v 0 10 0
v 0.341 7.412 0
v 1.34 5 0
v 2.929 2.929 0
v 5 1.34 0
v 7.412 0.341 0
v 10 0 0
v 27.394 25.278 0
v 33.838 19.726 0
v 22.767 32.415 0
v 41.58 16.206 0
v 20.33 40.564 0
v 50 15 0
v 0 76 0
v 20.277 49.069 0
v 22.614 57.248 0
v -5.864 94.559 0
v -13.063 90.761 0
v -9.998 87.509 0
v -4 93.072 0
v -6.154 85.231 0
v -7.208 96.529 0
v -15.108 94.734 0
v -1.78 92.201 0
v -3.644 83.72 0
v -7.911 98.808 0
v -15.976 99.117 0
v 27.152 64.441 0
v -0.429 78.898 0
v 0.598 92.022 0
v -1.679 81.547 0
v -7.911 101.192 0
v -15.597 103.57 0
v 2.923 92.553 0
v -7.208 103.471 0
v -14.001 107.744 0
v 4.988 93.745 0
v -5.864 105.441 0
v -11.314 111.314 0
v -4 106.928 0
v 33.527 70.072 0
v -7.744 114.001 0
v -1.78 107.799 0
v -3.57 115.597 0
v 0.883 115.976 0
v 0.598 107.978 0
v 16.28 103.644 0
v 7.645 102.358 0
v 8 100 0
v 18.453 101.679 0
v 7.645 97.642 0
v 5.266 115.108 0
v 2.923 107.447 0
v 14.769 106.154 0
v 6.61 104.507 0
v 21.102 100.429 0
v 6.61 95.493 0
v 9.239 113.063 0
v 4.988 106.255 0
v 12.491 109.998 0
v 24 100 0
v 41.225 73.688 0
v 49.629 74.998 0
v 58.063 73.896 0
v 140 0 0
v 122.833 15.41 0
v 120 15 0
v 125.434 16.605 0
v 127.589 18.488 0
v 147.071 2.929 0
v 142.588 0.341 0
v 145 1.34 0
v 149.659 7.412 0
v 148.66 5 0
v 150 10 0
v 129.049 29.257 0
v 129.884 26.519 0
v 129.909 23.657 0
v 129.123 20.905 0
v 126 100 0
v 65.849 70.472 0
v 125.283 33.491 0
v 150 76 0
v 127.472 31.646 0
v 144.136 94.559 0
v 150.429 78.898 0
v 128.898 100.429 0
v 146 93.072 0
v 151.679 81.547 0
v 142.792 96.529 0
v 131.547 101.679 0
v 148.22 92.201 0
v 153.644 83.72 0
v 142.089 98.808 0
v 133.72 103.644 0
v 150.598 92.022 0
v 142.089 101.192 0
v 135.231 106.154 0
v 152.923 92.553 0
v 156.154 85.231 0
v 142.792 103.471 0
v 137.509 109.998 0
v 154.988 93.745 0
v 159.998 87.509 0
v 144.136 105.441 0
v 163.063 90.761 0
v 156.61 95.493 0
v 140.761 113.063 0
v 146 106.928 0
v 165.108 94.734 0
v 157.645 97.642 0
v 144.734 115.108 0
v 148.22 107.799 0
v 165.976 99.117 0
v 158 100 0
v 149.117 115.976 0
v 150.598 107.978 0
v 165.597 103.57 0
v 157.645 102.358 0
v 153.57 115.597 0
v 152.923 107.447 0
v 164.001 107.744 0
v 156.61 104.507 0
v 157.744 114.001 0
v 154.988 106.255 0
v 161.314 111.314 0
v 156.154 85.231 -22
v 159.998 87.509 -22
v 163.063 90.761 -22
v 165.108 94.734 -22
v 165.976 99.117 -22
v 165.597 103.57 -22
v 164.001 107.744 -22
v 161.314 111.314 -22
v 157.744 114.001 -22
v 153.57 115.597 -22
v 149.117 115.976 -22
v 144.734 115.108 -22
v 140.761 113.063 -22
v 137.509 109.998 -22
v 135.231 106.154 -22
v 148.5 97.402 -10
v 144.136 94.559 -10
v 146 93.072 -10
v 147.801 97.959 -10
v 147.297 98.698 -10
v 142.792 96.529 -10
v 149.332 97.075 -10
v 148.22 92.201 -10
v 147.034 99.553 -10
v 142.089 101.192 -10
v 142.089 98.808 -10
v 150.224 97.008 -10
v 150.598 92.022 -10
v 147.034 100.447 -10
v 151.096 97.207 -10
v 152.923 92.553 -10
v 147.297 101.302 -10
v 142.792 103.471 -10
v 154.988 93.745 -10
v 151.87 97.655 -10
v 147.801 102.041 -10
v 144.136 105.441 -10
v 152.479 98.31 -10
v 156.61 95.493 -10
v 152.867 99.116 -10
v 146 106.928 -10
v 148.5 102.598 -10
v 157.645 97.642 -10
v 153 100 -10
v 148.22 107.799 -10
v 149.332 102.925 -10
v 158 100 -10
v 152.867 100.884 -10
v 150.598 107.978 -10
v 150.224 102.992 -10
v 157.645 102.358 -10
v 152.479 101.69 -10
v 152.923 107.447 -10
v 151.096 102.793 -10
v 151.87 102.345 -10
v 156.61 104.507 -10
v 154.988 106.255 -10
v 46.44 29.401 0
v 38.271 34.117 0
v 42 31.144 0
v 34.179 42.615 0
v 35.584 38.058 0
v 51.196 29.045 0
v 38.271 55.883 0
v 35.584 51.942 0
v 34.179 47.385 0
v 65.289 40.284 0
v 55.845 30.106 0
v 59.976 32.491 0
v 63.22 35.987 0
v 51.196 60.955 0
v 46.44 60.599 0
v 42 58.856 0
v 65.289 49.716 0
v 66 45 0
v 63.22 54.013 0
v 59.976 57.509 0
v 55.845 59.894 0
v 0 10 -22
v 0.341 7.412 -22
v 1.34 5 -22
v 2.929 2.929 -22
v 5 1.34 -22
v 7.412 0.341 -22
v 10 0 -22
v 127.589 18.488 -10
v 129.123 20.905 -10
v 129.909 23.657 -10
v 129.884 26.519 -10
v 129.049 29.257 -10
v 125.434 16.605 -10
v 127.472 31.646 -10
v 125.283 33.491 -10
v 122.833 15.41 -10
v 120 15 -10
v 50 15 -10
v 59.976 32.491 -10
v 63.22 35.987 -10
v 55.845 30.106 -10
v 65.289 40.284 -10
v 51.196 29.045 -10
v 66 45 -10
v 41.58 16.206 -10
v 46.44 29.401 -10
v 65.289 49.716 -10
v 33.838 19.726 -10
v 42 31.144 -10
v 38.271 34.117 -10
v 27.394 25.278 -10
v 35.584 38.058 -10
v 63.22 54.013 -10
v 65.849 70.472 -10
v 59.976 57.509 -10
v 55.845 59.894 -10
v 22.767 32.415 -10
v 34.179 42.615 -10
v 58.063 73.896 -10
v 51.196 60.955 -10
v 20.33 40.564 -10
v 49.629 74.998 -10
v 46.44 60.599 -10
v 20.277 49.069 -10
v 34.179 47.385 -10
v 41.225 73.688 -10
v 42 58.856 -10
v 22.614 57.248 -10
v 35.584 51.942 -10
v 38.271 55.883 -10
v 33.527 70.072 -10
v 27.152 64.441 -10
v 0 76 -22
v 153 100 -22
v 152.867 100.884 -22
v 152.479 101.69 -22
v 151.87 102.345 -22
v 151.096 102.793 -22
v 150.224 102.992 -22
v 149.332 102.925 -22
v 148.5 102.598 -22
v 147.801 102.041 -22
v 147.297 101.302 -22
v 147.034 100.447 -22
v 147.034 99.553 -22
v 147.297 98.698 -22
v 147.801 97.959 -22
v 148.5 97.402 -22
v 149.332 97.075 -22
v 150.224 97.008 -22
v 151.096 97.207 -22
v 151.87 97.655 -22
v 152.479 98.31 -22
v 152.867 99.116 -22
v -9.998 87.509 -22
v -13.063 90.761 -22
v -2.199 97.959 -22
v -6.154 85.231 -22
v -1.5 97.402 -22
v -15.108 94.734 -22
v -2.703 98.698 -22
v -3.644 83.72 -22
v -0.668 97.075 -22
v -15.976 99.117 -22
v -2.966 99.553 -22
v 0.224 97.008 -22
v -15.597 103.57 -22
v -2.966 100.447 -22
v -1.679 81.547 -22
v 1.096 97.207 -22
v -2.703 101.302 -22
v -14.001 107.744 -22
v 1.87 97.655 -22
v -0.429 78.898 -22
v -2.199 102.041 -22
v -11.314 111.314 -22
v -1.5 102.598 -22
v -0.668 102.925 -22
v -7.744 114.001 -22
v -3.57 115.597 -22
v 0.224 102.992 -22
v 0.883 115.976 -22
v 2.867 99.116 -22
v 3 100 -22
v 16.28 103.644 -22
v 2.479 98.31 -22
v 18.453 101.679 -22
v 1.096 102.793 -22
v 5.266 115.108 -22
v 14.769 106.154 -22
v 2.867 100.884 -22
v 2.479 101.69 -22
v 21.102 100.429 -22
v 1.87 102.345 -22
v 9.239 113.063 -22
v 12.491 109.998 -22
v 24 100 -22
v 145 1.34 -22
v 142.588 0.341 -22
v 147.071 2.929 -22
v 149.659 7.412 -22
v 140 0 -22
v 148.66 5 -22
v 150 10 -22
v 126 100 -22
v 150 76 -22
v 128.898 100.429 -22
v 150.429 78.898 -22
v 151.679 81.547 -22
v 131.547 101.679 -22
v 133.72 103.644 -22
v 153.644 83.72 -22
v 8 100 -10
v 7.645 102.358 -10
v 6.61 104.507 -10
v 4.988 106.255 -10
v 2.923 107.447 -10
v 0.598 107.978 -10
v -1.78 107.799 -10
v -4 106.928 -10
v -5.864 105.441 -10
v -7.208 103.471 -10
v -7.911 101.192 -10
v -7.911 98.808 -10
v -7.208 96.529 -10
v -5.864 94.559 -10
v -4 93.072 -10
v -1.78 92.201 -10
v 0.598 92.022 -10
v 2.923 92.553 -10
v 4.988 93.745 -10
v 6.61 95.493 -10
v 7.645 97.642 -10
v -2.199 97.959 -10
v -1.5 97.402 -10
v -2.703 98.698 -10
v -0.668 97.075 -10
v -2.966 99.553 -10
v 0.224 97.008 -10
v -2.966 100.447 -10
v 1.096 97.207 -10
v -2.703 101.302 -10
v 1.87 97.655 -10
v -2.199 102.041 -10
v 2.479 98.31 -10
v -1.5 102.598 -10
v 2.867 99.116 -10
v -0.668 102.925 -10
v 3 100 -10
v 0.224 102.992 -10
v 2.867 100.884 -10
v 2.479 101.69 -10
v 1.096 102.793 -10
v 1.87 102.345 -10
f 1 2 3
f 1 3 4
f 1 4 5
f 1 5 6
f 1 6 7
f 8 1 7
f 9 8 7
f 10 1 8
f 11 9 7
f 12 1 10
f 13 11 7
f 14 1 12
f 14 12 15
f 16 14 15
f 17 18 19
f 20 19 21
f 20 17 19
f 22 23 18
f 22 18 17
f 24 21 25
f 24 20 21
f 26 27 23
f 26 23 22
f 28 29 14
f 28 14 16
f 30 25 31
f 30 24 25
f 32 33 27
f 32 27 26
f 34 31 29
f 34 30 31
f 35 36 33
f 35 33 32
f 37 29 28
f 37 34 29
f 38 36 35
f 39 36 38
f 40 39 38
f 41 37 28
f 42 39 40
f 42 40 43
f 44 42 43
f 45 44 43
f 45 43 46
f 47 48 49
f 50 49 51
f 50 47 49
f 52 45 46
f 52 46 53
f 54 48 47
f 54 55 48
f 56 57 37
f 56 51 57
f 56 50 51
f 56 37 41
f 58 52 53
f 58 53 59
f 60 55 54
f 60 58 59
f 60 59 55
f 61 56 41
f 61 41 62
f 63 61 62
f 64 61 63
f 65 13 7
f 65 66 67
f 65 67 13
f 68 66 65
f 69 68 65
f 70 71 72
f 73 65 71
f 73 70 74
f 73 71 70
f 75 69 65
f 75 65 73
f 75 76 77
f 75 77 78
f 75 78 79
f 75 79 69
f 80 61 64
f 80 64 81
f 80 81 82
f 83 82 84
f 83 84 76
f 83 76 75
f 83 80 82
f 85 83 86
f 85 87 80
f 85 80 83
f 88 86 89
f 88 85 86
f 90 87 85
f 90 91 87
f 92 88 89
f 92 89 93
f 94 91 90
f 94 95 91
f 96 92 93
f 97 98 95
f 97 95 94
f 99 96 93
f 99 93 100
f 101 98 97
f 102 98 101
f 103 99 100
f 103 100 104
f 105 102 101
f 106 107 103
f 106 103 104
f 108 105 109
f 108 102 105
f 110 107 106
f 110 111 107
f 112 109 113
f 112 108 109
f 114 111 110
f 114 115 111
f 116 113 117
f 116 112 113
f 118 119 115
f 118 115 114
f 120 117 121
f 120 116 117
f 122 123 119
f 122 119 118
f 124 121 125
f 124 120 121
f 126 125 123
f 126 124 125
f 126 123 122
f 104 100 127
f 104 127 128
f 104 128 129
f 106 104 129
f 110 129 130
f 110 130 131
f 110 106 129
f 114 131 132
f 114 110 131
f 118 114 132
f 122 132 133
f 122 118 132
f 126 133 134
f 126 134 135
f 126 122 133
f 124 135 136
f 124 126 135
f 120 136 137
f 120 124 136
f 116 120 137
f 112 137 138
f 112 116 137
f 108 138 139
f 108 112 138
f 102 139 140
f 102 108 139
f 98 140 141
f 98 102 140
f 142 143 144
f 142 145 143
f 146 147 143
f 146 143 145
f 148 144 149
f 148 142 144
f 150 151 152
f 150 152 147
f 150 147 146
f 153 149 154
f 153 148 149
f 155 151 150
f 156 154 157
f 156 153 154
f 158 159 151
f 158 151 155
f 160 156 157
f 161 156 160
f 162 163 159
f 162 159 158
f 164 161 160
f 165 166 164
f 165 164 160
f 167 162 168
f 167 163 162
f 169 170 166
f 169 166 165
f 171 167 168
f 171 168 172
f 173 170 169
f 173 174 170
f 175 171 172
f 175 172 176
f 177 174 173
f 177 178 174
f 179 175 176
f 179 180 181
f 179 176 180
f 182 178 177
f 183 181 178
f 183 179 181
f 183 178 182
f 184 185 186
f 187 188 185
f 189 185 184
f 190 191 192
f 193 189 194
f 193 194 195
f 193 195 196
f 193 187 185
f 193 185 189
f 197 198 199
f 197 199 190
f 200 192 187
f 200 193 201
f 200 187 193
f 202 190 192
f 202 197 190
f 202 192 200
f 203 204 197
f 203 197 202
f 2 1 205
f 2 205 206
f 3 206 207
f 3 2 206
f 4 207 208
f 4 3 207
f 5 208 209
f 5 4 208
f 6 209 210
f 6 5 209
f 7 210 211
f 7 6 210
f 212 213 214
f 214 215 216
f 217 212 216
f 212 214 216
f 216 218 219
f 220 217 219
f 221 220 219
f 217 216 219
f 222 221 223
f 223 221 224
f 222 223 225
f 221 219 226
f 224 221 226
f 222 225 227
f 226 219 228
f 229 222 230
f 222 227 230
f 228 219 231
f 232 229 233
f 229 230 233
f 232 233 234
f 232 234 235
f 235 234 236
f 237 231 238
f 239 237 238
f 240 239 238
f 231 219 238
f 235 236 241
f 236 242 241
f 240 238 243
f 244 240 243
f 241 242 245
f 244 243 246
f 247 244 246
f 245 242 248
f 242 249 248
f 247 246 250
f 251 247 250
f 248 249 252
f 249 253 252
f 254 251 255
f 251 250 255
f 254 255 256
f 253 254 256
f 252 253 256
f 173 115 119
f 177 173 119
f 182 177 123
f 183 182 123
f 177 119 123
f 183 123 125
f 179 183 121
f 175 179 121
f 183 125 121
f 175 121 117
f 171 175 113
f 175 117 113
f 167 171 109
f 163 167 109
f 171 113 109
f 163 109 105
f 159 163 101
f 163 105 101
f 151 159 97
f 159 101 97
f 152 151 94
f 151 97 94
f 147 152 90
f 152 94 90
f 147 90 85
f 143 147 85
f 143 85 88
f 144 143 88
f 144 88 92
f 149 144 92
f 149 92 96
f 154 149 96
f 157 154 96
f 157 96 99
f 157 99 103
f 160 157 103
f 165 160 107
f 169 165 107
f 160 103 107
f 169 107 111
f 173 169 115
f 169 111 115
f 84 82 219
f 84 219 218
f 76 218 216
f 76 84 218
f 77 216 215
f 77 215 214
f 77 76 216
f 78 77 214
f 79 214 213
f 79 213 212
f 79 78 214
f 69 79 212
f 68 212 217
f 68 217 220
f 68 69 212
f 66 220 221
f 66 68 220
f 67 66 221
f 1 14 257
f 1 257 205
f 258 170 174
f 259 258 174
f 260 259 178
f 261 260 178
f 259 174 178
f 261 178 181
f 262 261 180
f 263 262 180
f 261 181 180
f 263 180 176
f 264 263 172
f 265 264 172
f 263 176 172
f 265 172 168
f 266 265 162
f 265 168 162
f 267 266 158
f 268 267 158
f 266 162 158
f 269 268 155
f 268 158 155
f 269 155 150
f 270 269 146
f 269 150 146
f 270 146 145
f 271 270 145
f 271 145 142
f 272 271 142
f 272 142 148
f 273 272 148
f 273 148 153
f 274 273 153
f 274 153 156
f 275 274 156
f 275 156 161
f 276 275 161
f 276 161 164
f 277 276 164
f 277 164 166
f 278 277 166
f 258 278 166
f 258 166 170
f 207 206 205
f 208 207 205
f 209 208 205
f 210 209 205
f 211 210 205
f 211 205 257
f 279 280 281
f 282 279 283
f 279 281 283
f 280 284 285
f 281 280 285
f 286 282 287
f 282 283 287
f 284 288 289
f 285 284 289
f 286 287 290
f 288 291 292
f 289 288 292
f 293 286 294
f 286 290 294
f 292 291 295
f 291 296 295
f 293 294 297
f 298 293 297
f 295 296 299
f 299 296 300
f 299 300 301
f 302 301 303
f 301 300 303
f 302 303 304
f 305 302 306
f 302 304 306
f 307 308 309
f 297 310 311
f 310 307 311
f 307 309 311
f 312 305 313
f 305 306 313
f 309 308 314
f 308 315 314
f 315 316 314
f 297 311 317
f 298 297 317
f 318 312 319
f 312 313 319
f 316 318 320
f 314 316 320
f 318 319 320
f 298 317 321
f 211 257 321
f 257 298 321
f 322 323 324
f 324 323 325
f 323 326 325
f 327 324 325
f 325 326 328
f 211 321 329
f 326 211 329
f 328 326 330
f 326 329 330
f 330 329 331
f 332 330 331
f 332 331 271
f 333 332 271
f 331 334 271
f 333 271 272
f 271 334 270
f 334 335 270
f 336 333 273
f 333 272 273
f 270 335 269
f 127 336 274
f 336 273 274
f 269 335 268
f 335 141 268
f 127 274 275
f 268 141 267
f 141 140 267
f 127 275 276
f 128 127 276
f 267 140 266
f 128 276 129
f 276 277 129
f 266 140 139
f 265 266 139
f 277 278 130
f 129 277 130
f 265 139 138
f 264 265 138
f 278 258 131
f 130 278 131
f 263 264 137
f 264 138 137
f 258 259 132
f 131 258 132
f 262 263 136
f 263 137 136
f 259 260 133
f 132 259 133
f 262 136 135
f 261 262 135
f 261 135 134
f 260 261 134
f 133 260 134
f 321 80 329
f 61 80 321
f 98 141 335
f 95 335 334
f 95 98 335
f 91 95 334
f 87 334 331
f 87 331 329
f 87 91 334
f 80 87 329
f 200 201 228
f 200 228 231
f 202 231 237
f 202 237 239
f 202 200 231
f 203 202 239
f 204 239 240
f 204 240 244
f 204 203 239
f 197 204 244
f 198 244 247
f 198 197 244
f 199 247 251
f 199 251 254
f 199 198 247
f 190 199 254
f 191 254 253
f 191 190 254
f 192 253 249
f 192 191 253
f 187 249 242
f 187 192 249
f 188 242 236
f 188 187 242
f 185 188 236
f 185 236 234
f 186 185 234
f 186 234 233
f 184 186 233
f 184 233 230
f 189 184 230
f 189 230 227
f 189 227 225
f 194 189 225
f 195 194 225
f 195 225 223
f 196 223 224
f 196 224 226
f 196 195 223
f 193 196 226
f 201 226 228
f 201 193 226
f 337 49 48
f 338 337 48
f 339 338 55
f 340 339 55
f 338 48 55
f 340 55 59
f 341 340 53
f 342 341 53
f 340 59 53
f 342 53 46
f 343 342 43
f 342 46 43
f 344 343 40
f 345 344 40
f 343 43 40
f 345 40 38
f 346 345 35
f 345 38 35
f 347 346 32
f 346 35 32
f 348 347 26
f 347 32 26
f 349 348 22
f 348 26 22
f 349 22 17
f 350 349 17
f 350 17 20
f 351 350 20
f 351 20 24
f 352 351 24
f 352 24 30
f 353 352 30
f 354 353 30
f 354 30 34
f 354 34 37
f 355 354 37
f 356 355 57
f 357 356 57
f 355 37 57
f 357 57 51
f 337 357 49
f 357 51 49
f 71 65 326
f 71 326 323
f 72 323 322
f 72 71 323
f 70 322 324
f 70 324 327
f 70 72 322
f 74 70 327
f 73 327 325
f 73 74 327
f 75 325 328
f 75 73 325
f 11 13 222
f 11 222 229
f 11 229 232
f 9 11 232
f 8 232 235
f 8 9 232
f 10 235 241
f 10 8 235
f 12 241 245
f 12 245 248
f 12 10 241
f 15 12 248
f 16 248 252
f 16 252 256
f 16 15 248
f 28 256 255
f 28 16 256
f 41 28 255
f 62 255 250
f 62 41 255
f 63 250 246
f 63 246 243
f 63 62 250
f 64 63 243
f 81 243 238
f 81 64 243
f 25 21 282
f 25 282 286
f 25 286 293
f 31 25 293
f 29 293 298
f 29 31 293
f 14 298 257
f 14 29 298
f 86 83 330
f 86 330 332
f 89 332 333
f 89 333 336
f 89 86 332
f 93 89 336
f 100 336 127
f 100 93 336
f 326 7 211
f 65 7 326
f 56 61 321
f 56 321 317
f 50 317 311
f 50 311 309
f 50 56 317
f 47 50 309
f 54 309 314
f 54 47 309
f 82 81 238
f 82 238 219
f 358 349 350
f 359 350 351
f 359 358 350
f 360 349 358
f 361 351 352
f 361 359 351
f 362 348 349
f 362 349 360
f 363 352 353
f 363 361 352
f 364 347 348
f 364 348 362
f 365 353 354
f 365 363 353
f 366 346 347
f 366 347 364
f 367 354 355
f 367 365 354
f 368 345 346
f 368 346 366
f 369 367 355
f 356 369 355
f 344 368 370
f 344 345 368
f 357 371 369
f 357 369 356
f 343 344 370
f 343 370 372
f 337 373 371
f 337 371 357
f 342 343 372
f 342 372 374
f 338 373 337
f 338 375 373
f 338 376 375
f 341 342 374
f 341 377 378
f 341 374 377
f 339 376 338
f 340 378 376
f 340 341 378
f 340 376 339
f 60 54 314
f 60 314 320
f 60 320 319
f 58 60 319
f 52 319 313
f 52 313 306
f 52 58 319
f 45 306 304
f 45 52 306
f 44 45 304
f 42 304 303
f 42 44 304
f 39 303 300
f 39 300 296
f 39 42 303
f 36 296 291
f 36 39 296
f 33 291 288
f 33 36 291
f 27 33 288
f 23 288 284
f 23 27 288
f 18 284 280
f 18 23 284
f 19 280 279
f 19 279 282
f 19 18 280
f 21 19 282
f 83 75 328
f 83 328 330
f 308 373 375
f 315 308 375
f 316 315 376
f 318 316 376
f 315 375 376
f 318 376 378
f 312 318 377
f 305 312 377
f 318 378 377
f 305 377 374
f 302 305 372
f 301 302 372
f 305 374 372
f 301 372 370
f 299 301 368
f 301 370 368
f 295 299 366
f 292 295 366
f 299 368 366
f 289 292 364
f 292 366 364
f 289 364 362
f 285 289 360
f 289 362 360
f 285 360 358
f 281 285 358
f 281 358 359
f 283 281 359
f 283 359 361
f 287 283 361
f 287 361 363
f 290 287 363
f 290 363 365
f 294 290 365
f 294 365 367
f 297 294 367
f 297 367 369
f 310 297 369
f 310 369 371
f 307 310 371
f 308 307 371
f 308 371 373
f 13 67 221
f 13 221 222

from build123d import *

# Parameters (mm, degrees)
SKETCH4_R          = 3
EXTRUDE1_DEPTH     = 22
SKETCH4_3_R        = 16
CUT_EXTRUDE1_DEPTH = 10
SKETCH4_4_R        = 8
CUT_EXTRUDE2_DEPTH = 10


with BuildPart() as part:
    # Sketch4 → Extrude1 (new body)
    with BuildSketch(Plane.XY):
        with BuildLine():
            Line((126, 100), (24, 100))
            ThreePointArc((24, 100), (18.452998038, 101.679497057), (14.769230769, 106.153846154))
            ThreePointArc((14.769230769, 106.153846154), (-11.313708499, 111.313708499), (-6.153846154, 85.230769231))
            ThreePointArc((-6.153846154, 85.230769231), (-1.679497057, 81.547001962), (0, 76))
            Line((0, 76), (0, 10))
            ThreePointArc((0, 10), (2.928932188, 2.928932188), (10, 0))
            Line((10, 0), (140, 0))
            ThreePointArc((140, 0), (147.071067812, 2.928932188), (150, 10))
            Line((150, 10), (150, 76))
            ThreePointArc((150, 76), (151.679497057, 81.547001962), (156.153846154, 85.230769231))
            ThreePointArc((156.153846154, 85.230769231), (161.313708499, 111.313708499), (135.230769231, 106.153846154))
            ThreePointArc((135.230769231, 106.153846154), (131.547001962, 101.679497057), (126, 100))
        make_face()
        with Locations((0, 100)):
            Circle(SKETCH4_R, mode=Mode.SUBTRACT)
        with Locations((150, 100)):
            Circle(SKETCH4_R, mode=Mode.SUBTRACT)
    extrude(amount=-EXTRUDE1_DEPTH)

    # Sketch4<3> → Cut-Extrude1 (cut)
    with BuildSketch(Plane.XY):
        with BuildLine():
            Line((65.849056604, 70.471698113), (125.283018868, 33.490566038))
            ThreePointArc((125.283018868, 33.490566038), (129.615239476, 22.252788721), (120, 15))
            Line((120, 15), (50, 15))
            ThreePointArc((50, 15), (21.154281571, 53.241633837), (65.849056604, 70.471698113))
        make_face()
        with Locations((50, 45)):
            Circle(SKETCH4_3_R, mode=Mode.SUBTRACT)
    extrude(amount=-CUT_EXTRUDE1_DEPTH, mode=Mode.SUBTRACT)

    # Sketch4<4> → Cut-Extrude2 (cut)
    with BuildSketch(Plane.XY):
        with Locations((0, 100)):
            Circle(SKETCH4_4_R)
        with Locations((150, 100)):
            Circle(SKETCH4_4_R)
    extrude(amount=-CUT_EXTRUDE2_DEPTH, mode=Mode.SUBTRACT)


solid = part.part
